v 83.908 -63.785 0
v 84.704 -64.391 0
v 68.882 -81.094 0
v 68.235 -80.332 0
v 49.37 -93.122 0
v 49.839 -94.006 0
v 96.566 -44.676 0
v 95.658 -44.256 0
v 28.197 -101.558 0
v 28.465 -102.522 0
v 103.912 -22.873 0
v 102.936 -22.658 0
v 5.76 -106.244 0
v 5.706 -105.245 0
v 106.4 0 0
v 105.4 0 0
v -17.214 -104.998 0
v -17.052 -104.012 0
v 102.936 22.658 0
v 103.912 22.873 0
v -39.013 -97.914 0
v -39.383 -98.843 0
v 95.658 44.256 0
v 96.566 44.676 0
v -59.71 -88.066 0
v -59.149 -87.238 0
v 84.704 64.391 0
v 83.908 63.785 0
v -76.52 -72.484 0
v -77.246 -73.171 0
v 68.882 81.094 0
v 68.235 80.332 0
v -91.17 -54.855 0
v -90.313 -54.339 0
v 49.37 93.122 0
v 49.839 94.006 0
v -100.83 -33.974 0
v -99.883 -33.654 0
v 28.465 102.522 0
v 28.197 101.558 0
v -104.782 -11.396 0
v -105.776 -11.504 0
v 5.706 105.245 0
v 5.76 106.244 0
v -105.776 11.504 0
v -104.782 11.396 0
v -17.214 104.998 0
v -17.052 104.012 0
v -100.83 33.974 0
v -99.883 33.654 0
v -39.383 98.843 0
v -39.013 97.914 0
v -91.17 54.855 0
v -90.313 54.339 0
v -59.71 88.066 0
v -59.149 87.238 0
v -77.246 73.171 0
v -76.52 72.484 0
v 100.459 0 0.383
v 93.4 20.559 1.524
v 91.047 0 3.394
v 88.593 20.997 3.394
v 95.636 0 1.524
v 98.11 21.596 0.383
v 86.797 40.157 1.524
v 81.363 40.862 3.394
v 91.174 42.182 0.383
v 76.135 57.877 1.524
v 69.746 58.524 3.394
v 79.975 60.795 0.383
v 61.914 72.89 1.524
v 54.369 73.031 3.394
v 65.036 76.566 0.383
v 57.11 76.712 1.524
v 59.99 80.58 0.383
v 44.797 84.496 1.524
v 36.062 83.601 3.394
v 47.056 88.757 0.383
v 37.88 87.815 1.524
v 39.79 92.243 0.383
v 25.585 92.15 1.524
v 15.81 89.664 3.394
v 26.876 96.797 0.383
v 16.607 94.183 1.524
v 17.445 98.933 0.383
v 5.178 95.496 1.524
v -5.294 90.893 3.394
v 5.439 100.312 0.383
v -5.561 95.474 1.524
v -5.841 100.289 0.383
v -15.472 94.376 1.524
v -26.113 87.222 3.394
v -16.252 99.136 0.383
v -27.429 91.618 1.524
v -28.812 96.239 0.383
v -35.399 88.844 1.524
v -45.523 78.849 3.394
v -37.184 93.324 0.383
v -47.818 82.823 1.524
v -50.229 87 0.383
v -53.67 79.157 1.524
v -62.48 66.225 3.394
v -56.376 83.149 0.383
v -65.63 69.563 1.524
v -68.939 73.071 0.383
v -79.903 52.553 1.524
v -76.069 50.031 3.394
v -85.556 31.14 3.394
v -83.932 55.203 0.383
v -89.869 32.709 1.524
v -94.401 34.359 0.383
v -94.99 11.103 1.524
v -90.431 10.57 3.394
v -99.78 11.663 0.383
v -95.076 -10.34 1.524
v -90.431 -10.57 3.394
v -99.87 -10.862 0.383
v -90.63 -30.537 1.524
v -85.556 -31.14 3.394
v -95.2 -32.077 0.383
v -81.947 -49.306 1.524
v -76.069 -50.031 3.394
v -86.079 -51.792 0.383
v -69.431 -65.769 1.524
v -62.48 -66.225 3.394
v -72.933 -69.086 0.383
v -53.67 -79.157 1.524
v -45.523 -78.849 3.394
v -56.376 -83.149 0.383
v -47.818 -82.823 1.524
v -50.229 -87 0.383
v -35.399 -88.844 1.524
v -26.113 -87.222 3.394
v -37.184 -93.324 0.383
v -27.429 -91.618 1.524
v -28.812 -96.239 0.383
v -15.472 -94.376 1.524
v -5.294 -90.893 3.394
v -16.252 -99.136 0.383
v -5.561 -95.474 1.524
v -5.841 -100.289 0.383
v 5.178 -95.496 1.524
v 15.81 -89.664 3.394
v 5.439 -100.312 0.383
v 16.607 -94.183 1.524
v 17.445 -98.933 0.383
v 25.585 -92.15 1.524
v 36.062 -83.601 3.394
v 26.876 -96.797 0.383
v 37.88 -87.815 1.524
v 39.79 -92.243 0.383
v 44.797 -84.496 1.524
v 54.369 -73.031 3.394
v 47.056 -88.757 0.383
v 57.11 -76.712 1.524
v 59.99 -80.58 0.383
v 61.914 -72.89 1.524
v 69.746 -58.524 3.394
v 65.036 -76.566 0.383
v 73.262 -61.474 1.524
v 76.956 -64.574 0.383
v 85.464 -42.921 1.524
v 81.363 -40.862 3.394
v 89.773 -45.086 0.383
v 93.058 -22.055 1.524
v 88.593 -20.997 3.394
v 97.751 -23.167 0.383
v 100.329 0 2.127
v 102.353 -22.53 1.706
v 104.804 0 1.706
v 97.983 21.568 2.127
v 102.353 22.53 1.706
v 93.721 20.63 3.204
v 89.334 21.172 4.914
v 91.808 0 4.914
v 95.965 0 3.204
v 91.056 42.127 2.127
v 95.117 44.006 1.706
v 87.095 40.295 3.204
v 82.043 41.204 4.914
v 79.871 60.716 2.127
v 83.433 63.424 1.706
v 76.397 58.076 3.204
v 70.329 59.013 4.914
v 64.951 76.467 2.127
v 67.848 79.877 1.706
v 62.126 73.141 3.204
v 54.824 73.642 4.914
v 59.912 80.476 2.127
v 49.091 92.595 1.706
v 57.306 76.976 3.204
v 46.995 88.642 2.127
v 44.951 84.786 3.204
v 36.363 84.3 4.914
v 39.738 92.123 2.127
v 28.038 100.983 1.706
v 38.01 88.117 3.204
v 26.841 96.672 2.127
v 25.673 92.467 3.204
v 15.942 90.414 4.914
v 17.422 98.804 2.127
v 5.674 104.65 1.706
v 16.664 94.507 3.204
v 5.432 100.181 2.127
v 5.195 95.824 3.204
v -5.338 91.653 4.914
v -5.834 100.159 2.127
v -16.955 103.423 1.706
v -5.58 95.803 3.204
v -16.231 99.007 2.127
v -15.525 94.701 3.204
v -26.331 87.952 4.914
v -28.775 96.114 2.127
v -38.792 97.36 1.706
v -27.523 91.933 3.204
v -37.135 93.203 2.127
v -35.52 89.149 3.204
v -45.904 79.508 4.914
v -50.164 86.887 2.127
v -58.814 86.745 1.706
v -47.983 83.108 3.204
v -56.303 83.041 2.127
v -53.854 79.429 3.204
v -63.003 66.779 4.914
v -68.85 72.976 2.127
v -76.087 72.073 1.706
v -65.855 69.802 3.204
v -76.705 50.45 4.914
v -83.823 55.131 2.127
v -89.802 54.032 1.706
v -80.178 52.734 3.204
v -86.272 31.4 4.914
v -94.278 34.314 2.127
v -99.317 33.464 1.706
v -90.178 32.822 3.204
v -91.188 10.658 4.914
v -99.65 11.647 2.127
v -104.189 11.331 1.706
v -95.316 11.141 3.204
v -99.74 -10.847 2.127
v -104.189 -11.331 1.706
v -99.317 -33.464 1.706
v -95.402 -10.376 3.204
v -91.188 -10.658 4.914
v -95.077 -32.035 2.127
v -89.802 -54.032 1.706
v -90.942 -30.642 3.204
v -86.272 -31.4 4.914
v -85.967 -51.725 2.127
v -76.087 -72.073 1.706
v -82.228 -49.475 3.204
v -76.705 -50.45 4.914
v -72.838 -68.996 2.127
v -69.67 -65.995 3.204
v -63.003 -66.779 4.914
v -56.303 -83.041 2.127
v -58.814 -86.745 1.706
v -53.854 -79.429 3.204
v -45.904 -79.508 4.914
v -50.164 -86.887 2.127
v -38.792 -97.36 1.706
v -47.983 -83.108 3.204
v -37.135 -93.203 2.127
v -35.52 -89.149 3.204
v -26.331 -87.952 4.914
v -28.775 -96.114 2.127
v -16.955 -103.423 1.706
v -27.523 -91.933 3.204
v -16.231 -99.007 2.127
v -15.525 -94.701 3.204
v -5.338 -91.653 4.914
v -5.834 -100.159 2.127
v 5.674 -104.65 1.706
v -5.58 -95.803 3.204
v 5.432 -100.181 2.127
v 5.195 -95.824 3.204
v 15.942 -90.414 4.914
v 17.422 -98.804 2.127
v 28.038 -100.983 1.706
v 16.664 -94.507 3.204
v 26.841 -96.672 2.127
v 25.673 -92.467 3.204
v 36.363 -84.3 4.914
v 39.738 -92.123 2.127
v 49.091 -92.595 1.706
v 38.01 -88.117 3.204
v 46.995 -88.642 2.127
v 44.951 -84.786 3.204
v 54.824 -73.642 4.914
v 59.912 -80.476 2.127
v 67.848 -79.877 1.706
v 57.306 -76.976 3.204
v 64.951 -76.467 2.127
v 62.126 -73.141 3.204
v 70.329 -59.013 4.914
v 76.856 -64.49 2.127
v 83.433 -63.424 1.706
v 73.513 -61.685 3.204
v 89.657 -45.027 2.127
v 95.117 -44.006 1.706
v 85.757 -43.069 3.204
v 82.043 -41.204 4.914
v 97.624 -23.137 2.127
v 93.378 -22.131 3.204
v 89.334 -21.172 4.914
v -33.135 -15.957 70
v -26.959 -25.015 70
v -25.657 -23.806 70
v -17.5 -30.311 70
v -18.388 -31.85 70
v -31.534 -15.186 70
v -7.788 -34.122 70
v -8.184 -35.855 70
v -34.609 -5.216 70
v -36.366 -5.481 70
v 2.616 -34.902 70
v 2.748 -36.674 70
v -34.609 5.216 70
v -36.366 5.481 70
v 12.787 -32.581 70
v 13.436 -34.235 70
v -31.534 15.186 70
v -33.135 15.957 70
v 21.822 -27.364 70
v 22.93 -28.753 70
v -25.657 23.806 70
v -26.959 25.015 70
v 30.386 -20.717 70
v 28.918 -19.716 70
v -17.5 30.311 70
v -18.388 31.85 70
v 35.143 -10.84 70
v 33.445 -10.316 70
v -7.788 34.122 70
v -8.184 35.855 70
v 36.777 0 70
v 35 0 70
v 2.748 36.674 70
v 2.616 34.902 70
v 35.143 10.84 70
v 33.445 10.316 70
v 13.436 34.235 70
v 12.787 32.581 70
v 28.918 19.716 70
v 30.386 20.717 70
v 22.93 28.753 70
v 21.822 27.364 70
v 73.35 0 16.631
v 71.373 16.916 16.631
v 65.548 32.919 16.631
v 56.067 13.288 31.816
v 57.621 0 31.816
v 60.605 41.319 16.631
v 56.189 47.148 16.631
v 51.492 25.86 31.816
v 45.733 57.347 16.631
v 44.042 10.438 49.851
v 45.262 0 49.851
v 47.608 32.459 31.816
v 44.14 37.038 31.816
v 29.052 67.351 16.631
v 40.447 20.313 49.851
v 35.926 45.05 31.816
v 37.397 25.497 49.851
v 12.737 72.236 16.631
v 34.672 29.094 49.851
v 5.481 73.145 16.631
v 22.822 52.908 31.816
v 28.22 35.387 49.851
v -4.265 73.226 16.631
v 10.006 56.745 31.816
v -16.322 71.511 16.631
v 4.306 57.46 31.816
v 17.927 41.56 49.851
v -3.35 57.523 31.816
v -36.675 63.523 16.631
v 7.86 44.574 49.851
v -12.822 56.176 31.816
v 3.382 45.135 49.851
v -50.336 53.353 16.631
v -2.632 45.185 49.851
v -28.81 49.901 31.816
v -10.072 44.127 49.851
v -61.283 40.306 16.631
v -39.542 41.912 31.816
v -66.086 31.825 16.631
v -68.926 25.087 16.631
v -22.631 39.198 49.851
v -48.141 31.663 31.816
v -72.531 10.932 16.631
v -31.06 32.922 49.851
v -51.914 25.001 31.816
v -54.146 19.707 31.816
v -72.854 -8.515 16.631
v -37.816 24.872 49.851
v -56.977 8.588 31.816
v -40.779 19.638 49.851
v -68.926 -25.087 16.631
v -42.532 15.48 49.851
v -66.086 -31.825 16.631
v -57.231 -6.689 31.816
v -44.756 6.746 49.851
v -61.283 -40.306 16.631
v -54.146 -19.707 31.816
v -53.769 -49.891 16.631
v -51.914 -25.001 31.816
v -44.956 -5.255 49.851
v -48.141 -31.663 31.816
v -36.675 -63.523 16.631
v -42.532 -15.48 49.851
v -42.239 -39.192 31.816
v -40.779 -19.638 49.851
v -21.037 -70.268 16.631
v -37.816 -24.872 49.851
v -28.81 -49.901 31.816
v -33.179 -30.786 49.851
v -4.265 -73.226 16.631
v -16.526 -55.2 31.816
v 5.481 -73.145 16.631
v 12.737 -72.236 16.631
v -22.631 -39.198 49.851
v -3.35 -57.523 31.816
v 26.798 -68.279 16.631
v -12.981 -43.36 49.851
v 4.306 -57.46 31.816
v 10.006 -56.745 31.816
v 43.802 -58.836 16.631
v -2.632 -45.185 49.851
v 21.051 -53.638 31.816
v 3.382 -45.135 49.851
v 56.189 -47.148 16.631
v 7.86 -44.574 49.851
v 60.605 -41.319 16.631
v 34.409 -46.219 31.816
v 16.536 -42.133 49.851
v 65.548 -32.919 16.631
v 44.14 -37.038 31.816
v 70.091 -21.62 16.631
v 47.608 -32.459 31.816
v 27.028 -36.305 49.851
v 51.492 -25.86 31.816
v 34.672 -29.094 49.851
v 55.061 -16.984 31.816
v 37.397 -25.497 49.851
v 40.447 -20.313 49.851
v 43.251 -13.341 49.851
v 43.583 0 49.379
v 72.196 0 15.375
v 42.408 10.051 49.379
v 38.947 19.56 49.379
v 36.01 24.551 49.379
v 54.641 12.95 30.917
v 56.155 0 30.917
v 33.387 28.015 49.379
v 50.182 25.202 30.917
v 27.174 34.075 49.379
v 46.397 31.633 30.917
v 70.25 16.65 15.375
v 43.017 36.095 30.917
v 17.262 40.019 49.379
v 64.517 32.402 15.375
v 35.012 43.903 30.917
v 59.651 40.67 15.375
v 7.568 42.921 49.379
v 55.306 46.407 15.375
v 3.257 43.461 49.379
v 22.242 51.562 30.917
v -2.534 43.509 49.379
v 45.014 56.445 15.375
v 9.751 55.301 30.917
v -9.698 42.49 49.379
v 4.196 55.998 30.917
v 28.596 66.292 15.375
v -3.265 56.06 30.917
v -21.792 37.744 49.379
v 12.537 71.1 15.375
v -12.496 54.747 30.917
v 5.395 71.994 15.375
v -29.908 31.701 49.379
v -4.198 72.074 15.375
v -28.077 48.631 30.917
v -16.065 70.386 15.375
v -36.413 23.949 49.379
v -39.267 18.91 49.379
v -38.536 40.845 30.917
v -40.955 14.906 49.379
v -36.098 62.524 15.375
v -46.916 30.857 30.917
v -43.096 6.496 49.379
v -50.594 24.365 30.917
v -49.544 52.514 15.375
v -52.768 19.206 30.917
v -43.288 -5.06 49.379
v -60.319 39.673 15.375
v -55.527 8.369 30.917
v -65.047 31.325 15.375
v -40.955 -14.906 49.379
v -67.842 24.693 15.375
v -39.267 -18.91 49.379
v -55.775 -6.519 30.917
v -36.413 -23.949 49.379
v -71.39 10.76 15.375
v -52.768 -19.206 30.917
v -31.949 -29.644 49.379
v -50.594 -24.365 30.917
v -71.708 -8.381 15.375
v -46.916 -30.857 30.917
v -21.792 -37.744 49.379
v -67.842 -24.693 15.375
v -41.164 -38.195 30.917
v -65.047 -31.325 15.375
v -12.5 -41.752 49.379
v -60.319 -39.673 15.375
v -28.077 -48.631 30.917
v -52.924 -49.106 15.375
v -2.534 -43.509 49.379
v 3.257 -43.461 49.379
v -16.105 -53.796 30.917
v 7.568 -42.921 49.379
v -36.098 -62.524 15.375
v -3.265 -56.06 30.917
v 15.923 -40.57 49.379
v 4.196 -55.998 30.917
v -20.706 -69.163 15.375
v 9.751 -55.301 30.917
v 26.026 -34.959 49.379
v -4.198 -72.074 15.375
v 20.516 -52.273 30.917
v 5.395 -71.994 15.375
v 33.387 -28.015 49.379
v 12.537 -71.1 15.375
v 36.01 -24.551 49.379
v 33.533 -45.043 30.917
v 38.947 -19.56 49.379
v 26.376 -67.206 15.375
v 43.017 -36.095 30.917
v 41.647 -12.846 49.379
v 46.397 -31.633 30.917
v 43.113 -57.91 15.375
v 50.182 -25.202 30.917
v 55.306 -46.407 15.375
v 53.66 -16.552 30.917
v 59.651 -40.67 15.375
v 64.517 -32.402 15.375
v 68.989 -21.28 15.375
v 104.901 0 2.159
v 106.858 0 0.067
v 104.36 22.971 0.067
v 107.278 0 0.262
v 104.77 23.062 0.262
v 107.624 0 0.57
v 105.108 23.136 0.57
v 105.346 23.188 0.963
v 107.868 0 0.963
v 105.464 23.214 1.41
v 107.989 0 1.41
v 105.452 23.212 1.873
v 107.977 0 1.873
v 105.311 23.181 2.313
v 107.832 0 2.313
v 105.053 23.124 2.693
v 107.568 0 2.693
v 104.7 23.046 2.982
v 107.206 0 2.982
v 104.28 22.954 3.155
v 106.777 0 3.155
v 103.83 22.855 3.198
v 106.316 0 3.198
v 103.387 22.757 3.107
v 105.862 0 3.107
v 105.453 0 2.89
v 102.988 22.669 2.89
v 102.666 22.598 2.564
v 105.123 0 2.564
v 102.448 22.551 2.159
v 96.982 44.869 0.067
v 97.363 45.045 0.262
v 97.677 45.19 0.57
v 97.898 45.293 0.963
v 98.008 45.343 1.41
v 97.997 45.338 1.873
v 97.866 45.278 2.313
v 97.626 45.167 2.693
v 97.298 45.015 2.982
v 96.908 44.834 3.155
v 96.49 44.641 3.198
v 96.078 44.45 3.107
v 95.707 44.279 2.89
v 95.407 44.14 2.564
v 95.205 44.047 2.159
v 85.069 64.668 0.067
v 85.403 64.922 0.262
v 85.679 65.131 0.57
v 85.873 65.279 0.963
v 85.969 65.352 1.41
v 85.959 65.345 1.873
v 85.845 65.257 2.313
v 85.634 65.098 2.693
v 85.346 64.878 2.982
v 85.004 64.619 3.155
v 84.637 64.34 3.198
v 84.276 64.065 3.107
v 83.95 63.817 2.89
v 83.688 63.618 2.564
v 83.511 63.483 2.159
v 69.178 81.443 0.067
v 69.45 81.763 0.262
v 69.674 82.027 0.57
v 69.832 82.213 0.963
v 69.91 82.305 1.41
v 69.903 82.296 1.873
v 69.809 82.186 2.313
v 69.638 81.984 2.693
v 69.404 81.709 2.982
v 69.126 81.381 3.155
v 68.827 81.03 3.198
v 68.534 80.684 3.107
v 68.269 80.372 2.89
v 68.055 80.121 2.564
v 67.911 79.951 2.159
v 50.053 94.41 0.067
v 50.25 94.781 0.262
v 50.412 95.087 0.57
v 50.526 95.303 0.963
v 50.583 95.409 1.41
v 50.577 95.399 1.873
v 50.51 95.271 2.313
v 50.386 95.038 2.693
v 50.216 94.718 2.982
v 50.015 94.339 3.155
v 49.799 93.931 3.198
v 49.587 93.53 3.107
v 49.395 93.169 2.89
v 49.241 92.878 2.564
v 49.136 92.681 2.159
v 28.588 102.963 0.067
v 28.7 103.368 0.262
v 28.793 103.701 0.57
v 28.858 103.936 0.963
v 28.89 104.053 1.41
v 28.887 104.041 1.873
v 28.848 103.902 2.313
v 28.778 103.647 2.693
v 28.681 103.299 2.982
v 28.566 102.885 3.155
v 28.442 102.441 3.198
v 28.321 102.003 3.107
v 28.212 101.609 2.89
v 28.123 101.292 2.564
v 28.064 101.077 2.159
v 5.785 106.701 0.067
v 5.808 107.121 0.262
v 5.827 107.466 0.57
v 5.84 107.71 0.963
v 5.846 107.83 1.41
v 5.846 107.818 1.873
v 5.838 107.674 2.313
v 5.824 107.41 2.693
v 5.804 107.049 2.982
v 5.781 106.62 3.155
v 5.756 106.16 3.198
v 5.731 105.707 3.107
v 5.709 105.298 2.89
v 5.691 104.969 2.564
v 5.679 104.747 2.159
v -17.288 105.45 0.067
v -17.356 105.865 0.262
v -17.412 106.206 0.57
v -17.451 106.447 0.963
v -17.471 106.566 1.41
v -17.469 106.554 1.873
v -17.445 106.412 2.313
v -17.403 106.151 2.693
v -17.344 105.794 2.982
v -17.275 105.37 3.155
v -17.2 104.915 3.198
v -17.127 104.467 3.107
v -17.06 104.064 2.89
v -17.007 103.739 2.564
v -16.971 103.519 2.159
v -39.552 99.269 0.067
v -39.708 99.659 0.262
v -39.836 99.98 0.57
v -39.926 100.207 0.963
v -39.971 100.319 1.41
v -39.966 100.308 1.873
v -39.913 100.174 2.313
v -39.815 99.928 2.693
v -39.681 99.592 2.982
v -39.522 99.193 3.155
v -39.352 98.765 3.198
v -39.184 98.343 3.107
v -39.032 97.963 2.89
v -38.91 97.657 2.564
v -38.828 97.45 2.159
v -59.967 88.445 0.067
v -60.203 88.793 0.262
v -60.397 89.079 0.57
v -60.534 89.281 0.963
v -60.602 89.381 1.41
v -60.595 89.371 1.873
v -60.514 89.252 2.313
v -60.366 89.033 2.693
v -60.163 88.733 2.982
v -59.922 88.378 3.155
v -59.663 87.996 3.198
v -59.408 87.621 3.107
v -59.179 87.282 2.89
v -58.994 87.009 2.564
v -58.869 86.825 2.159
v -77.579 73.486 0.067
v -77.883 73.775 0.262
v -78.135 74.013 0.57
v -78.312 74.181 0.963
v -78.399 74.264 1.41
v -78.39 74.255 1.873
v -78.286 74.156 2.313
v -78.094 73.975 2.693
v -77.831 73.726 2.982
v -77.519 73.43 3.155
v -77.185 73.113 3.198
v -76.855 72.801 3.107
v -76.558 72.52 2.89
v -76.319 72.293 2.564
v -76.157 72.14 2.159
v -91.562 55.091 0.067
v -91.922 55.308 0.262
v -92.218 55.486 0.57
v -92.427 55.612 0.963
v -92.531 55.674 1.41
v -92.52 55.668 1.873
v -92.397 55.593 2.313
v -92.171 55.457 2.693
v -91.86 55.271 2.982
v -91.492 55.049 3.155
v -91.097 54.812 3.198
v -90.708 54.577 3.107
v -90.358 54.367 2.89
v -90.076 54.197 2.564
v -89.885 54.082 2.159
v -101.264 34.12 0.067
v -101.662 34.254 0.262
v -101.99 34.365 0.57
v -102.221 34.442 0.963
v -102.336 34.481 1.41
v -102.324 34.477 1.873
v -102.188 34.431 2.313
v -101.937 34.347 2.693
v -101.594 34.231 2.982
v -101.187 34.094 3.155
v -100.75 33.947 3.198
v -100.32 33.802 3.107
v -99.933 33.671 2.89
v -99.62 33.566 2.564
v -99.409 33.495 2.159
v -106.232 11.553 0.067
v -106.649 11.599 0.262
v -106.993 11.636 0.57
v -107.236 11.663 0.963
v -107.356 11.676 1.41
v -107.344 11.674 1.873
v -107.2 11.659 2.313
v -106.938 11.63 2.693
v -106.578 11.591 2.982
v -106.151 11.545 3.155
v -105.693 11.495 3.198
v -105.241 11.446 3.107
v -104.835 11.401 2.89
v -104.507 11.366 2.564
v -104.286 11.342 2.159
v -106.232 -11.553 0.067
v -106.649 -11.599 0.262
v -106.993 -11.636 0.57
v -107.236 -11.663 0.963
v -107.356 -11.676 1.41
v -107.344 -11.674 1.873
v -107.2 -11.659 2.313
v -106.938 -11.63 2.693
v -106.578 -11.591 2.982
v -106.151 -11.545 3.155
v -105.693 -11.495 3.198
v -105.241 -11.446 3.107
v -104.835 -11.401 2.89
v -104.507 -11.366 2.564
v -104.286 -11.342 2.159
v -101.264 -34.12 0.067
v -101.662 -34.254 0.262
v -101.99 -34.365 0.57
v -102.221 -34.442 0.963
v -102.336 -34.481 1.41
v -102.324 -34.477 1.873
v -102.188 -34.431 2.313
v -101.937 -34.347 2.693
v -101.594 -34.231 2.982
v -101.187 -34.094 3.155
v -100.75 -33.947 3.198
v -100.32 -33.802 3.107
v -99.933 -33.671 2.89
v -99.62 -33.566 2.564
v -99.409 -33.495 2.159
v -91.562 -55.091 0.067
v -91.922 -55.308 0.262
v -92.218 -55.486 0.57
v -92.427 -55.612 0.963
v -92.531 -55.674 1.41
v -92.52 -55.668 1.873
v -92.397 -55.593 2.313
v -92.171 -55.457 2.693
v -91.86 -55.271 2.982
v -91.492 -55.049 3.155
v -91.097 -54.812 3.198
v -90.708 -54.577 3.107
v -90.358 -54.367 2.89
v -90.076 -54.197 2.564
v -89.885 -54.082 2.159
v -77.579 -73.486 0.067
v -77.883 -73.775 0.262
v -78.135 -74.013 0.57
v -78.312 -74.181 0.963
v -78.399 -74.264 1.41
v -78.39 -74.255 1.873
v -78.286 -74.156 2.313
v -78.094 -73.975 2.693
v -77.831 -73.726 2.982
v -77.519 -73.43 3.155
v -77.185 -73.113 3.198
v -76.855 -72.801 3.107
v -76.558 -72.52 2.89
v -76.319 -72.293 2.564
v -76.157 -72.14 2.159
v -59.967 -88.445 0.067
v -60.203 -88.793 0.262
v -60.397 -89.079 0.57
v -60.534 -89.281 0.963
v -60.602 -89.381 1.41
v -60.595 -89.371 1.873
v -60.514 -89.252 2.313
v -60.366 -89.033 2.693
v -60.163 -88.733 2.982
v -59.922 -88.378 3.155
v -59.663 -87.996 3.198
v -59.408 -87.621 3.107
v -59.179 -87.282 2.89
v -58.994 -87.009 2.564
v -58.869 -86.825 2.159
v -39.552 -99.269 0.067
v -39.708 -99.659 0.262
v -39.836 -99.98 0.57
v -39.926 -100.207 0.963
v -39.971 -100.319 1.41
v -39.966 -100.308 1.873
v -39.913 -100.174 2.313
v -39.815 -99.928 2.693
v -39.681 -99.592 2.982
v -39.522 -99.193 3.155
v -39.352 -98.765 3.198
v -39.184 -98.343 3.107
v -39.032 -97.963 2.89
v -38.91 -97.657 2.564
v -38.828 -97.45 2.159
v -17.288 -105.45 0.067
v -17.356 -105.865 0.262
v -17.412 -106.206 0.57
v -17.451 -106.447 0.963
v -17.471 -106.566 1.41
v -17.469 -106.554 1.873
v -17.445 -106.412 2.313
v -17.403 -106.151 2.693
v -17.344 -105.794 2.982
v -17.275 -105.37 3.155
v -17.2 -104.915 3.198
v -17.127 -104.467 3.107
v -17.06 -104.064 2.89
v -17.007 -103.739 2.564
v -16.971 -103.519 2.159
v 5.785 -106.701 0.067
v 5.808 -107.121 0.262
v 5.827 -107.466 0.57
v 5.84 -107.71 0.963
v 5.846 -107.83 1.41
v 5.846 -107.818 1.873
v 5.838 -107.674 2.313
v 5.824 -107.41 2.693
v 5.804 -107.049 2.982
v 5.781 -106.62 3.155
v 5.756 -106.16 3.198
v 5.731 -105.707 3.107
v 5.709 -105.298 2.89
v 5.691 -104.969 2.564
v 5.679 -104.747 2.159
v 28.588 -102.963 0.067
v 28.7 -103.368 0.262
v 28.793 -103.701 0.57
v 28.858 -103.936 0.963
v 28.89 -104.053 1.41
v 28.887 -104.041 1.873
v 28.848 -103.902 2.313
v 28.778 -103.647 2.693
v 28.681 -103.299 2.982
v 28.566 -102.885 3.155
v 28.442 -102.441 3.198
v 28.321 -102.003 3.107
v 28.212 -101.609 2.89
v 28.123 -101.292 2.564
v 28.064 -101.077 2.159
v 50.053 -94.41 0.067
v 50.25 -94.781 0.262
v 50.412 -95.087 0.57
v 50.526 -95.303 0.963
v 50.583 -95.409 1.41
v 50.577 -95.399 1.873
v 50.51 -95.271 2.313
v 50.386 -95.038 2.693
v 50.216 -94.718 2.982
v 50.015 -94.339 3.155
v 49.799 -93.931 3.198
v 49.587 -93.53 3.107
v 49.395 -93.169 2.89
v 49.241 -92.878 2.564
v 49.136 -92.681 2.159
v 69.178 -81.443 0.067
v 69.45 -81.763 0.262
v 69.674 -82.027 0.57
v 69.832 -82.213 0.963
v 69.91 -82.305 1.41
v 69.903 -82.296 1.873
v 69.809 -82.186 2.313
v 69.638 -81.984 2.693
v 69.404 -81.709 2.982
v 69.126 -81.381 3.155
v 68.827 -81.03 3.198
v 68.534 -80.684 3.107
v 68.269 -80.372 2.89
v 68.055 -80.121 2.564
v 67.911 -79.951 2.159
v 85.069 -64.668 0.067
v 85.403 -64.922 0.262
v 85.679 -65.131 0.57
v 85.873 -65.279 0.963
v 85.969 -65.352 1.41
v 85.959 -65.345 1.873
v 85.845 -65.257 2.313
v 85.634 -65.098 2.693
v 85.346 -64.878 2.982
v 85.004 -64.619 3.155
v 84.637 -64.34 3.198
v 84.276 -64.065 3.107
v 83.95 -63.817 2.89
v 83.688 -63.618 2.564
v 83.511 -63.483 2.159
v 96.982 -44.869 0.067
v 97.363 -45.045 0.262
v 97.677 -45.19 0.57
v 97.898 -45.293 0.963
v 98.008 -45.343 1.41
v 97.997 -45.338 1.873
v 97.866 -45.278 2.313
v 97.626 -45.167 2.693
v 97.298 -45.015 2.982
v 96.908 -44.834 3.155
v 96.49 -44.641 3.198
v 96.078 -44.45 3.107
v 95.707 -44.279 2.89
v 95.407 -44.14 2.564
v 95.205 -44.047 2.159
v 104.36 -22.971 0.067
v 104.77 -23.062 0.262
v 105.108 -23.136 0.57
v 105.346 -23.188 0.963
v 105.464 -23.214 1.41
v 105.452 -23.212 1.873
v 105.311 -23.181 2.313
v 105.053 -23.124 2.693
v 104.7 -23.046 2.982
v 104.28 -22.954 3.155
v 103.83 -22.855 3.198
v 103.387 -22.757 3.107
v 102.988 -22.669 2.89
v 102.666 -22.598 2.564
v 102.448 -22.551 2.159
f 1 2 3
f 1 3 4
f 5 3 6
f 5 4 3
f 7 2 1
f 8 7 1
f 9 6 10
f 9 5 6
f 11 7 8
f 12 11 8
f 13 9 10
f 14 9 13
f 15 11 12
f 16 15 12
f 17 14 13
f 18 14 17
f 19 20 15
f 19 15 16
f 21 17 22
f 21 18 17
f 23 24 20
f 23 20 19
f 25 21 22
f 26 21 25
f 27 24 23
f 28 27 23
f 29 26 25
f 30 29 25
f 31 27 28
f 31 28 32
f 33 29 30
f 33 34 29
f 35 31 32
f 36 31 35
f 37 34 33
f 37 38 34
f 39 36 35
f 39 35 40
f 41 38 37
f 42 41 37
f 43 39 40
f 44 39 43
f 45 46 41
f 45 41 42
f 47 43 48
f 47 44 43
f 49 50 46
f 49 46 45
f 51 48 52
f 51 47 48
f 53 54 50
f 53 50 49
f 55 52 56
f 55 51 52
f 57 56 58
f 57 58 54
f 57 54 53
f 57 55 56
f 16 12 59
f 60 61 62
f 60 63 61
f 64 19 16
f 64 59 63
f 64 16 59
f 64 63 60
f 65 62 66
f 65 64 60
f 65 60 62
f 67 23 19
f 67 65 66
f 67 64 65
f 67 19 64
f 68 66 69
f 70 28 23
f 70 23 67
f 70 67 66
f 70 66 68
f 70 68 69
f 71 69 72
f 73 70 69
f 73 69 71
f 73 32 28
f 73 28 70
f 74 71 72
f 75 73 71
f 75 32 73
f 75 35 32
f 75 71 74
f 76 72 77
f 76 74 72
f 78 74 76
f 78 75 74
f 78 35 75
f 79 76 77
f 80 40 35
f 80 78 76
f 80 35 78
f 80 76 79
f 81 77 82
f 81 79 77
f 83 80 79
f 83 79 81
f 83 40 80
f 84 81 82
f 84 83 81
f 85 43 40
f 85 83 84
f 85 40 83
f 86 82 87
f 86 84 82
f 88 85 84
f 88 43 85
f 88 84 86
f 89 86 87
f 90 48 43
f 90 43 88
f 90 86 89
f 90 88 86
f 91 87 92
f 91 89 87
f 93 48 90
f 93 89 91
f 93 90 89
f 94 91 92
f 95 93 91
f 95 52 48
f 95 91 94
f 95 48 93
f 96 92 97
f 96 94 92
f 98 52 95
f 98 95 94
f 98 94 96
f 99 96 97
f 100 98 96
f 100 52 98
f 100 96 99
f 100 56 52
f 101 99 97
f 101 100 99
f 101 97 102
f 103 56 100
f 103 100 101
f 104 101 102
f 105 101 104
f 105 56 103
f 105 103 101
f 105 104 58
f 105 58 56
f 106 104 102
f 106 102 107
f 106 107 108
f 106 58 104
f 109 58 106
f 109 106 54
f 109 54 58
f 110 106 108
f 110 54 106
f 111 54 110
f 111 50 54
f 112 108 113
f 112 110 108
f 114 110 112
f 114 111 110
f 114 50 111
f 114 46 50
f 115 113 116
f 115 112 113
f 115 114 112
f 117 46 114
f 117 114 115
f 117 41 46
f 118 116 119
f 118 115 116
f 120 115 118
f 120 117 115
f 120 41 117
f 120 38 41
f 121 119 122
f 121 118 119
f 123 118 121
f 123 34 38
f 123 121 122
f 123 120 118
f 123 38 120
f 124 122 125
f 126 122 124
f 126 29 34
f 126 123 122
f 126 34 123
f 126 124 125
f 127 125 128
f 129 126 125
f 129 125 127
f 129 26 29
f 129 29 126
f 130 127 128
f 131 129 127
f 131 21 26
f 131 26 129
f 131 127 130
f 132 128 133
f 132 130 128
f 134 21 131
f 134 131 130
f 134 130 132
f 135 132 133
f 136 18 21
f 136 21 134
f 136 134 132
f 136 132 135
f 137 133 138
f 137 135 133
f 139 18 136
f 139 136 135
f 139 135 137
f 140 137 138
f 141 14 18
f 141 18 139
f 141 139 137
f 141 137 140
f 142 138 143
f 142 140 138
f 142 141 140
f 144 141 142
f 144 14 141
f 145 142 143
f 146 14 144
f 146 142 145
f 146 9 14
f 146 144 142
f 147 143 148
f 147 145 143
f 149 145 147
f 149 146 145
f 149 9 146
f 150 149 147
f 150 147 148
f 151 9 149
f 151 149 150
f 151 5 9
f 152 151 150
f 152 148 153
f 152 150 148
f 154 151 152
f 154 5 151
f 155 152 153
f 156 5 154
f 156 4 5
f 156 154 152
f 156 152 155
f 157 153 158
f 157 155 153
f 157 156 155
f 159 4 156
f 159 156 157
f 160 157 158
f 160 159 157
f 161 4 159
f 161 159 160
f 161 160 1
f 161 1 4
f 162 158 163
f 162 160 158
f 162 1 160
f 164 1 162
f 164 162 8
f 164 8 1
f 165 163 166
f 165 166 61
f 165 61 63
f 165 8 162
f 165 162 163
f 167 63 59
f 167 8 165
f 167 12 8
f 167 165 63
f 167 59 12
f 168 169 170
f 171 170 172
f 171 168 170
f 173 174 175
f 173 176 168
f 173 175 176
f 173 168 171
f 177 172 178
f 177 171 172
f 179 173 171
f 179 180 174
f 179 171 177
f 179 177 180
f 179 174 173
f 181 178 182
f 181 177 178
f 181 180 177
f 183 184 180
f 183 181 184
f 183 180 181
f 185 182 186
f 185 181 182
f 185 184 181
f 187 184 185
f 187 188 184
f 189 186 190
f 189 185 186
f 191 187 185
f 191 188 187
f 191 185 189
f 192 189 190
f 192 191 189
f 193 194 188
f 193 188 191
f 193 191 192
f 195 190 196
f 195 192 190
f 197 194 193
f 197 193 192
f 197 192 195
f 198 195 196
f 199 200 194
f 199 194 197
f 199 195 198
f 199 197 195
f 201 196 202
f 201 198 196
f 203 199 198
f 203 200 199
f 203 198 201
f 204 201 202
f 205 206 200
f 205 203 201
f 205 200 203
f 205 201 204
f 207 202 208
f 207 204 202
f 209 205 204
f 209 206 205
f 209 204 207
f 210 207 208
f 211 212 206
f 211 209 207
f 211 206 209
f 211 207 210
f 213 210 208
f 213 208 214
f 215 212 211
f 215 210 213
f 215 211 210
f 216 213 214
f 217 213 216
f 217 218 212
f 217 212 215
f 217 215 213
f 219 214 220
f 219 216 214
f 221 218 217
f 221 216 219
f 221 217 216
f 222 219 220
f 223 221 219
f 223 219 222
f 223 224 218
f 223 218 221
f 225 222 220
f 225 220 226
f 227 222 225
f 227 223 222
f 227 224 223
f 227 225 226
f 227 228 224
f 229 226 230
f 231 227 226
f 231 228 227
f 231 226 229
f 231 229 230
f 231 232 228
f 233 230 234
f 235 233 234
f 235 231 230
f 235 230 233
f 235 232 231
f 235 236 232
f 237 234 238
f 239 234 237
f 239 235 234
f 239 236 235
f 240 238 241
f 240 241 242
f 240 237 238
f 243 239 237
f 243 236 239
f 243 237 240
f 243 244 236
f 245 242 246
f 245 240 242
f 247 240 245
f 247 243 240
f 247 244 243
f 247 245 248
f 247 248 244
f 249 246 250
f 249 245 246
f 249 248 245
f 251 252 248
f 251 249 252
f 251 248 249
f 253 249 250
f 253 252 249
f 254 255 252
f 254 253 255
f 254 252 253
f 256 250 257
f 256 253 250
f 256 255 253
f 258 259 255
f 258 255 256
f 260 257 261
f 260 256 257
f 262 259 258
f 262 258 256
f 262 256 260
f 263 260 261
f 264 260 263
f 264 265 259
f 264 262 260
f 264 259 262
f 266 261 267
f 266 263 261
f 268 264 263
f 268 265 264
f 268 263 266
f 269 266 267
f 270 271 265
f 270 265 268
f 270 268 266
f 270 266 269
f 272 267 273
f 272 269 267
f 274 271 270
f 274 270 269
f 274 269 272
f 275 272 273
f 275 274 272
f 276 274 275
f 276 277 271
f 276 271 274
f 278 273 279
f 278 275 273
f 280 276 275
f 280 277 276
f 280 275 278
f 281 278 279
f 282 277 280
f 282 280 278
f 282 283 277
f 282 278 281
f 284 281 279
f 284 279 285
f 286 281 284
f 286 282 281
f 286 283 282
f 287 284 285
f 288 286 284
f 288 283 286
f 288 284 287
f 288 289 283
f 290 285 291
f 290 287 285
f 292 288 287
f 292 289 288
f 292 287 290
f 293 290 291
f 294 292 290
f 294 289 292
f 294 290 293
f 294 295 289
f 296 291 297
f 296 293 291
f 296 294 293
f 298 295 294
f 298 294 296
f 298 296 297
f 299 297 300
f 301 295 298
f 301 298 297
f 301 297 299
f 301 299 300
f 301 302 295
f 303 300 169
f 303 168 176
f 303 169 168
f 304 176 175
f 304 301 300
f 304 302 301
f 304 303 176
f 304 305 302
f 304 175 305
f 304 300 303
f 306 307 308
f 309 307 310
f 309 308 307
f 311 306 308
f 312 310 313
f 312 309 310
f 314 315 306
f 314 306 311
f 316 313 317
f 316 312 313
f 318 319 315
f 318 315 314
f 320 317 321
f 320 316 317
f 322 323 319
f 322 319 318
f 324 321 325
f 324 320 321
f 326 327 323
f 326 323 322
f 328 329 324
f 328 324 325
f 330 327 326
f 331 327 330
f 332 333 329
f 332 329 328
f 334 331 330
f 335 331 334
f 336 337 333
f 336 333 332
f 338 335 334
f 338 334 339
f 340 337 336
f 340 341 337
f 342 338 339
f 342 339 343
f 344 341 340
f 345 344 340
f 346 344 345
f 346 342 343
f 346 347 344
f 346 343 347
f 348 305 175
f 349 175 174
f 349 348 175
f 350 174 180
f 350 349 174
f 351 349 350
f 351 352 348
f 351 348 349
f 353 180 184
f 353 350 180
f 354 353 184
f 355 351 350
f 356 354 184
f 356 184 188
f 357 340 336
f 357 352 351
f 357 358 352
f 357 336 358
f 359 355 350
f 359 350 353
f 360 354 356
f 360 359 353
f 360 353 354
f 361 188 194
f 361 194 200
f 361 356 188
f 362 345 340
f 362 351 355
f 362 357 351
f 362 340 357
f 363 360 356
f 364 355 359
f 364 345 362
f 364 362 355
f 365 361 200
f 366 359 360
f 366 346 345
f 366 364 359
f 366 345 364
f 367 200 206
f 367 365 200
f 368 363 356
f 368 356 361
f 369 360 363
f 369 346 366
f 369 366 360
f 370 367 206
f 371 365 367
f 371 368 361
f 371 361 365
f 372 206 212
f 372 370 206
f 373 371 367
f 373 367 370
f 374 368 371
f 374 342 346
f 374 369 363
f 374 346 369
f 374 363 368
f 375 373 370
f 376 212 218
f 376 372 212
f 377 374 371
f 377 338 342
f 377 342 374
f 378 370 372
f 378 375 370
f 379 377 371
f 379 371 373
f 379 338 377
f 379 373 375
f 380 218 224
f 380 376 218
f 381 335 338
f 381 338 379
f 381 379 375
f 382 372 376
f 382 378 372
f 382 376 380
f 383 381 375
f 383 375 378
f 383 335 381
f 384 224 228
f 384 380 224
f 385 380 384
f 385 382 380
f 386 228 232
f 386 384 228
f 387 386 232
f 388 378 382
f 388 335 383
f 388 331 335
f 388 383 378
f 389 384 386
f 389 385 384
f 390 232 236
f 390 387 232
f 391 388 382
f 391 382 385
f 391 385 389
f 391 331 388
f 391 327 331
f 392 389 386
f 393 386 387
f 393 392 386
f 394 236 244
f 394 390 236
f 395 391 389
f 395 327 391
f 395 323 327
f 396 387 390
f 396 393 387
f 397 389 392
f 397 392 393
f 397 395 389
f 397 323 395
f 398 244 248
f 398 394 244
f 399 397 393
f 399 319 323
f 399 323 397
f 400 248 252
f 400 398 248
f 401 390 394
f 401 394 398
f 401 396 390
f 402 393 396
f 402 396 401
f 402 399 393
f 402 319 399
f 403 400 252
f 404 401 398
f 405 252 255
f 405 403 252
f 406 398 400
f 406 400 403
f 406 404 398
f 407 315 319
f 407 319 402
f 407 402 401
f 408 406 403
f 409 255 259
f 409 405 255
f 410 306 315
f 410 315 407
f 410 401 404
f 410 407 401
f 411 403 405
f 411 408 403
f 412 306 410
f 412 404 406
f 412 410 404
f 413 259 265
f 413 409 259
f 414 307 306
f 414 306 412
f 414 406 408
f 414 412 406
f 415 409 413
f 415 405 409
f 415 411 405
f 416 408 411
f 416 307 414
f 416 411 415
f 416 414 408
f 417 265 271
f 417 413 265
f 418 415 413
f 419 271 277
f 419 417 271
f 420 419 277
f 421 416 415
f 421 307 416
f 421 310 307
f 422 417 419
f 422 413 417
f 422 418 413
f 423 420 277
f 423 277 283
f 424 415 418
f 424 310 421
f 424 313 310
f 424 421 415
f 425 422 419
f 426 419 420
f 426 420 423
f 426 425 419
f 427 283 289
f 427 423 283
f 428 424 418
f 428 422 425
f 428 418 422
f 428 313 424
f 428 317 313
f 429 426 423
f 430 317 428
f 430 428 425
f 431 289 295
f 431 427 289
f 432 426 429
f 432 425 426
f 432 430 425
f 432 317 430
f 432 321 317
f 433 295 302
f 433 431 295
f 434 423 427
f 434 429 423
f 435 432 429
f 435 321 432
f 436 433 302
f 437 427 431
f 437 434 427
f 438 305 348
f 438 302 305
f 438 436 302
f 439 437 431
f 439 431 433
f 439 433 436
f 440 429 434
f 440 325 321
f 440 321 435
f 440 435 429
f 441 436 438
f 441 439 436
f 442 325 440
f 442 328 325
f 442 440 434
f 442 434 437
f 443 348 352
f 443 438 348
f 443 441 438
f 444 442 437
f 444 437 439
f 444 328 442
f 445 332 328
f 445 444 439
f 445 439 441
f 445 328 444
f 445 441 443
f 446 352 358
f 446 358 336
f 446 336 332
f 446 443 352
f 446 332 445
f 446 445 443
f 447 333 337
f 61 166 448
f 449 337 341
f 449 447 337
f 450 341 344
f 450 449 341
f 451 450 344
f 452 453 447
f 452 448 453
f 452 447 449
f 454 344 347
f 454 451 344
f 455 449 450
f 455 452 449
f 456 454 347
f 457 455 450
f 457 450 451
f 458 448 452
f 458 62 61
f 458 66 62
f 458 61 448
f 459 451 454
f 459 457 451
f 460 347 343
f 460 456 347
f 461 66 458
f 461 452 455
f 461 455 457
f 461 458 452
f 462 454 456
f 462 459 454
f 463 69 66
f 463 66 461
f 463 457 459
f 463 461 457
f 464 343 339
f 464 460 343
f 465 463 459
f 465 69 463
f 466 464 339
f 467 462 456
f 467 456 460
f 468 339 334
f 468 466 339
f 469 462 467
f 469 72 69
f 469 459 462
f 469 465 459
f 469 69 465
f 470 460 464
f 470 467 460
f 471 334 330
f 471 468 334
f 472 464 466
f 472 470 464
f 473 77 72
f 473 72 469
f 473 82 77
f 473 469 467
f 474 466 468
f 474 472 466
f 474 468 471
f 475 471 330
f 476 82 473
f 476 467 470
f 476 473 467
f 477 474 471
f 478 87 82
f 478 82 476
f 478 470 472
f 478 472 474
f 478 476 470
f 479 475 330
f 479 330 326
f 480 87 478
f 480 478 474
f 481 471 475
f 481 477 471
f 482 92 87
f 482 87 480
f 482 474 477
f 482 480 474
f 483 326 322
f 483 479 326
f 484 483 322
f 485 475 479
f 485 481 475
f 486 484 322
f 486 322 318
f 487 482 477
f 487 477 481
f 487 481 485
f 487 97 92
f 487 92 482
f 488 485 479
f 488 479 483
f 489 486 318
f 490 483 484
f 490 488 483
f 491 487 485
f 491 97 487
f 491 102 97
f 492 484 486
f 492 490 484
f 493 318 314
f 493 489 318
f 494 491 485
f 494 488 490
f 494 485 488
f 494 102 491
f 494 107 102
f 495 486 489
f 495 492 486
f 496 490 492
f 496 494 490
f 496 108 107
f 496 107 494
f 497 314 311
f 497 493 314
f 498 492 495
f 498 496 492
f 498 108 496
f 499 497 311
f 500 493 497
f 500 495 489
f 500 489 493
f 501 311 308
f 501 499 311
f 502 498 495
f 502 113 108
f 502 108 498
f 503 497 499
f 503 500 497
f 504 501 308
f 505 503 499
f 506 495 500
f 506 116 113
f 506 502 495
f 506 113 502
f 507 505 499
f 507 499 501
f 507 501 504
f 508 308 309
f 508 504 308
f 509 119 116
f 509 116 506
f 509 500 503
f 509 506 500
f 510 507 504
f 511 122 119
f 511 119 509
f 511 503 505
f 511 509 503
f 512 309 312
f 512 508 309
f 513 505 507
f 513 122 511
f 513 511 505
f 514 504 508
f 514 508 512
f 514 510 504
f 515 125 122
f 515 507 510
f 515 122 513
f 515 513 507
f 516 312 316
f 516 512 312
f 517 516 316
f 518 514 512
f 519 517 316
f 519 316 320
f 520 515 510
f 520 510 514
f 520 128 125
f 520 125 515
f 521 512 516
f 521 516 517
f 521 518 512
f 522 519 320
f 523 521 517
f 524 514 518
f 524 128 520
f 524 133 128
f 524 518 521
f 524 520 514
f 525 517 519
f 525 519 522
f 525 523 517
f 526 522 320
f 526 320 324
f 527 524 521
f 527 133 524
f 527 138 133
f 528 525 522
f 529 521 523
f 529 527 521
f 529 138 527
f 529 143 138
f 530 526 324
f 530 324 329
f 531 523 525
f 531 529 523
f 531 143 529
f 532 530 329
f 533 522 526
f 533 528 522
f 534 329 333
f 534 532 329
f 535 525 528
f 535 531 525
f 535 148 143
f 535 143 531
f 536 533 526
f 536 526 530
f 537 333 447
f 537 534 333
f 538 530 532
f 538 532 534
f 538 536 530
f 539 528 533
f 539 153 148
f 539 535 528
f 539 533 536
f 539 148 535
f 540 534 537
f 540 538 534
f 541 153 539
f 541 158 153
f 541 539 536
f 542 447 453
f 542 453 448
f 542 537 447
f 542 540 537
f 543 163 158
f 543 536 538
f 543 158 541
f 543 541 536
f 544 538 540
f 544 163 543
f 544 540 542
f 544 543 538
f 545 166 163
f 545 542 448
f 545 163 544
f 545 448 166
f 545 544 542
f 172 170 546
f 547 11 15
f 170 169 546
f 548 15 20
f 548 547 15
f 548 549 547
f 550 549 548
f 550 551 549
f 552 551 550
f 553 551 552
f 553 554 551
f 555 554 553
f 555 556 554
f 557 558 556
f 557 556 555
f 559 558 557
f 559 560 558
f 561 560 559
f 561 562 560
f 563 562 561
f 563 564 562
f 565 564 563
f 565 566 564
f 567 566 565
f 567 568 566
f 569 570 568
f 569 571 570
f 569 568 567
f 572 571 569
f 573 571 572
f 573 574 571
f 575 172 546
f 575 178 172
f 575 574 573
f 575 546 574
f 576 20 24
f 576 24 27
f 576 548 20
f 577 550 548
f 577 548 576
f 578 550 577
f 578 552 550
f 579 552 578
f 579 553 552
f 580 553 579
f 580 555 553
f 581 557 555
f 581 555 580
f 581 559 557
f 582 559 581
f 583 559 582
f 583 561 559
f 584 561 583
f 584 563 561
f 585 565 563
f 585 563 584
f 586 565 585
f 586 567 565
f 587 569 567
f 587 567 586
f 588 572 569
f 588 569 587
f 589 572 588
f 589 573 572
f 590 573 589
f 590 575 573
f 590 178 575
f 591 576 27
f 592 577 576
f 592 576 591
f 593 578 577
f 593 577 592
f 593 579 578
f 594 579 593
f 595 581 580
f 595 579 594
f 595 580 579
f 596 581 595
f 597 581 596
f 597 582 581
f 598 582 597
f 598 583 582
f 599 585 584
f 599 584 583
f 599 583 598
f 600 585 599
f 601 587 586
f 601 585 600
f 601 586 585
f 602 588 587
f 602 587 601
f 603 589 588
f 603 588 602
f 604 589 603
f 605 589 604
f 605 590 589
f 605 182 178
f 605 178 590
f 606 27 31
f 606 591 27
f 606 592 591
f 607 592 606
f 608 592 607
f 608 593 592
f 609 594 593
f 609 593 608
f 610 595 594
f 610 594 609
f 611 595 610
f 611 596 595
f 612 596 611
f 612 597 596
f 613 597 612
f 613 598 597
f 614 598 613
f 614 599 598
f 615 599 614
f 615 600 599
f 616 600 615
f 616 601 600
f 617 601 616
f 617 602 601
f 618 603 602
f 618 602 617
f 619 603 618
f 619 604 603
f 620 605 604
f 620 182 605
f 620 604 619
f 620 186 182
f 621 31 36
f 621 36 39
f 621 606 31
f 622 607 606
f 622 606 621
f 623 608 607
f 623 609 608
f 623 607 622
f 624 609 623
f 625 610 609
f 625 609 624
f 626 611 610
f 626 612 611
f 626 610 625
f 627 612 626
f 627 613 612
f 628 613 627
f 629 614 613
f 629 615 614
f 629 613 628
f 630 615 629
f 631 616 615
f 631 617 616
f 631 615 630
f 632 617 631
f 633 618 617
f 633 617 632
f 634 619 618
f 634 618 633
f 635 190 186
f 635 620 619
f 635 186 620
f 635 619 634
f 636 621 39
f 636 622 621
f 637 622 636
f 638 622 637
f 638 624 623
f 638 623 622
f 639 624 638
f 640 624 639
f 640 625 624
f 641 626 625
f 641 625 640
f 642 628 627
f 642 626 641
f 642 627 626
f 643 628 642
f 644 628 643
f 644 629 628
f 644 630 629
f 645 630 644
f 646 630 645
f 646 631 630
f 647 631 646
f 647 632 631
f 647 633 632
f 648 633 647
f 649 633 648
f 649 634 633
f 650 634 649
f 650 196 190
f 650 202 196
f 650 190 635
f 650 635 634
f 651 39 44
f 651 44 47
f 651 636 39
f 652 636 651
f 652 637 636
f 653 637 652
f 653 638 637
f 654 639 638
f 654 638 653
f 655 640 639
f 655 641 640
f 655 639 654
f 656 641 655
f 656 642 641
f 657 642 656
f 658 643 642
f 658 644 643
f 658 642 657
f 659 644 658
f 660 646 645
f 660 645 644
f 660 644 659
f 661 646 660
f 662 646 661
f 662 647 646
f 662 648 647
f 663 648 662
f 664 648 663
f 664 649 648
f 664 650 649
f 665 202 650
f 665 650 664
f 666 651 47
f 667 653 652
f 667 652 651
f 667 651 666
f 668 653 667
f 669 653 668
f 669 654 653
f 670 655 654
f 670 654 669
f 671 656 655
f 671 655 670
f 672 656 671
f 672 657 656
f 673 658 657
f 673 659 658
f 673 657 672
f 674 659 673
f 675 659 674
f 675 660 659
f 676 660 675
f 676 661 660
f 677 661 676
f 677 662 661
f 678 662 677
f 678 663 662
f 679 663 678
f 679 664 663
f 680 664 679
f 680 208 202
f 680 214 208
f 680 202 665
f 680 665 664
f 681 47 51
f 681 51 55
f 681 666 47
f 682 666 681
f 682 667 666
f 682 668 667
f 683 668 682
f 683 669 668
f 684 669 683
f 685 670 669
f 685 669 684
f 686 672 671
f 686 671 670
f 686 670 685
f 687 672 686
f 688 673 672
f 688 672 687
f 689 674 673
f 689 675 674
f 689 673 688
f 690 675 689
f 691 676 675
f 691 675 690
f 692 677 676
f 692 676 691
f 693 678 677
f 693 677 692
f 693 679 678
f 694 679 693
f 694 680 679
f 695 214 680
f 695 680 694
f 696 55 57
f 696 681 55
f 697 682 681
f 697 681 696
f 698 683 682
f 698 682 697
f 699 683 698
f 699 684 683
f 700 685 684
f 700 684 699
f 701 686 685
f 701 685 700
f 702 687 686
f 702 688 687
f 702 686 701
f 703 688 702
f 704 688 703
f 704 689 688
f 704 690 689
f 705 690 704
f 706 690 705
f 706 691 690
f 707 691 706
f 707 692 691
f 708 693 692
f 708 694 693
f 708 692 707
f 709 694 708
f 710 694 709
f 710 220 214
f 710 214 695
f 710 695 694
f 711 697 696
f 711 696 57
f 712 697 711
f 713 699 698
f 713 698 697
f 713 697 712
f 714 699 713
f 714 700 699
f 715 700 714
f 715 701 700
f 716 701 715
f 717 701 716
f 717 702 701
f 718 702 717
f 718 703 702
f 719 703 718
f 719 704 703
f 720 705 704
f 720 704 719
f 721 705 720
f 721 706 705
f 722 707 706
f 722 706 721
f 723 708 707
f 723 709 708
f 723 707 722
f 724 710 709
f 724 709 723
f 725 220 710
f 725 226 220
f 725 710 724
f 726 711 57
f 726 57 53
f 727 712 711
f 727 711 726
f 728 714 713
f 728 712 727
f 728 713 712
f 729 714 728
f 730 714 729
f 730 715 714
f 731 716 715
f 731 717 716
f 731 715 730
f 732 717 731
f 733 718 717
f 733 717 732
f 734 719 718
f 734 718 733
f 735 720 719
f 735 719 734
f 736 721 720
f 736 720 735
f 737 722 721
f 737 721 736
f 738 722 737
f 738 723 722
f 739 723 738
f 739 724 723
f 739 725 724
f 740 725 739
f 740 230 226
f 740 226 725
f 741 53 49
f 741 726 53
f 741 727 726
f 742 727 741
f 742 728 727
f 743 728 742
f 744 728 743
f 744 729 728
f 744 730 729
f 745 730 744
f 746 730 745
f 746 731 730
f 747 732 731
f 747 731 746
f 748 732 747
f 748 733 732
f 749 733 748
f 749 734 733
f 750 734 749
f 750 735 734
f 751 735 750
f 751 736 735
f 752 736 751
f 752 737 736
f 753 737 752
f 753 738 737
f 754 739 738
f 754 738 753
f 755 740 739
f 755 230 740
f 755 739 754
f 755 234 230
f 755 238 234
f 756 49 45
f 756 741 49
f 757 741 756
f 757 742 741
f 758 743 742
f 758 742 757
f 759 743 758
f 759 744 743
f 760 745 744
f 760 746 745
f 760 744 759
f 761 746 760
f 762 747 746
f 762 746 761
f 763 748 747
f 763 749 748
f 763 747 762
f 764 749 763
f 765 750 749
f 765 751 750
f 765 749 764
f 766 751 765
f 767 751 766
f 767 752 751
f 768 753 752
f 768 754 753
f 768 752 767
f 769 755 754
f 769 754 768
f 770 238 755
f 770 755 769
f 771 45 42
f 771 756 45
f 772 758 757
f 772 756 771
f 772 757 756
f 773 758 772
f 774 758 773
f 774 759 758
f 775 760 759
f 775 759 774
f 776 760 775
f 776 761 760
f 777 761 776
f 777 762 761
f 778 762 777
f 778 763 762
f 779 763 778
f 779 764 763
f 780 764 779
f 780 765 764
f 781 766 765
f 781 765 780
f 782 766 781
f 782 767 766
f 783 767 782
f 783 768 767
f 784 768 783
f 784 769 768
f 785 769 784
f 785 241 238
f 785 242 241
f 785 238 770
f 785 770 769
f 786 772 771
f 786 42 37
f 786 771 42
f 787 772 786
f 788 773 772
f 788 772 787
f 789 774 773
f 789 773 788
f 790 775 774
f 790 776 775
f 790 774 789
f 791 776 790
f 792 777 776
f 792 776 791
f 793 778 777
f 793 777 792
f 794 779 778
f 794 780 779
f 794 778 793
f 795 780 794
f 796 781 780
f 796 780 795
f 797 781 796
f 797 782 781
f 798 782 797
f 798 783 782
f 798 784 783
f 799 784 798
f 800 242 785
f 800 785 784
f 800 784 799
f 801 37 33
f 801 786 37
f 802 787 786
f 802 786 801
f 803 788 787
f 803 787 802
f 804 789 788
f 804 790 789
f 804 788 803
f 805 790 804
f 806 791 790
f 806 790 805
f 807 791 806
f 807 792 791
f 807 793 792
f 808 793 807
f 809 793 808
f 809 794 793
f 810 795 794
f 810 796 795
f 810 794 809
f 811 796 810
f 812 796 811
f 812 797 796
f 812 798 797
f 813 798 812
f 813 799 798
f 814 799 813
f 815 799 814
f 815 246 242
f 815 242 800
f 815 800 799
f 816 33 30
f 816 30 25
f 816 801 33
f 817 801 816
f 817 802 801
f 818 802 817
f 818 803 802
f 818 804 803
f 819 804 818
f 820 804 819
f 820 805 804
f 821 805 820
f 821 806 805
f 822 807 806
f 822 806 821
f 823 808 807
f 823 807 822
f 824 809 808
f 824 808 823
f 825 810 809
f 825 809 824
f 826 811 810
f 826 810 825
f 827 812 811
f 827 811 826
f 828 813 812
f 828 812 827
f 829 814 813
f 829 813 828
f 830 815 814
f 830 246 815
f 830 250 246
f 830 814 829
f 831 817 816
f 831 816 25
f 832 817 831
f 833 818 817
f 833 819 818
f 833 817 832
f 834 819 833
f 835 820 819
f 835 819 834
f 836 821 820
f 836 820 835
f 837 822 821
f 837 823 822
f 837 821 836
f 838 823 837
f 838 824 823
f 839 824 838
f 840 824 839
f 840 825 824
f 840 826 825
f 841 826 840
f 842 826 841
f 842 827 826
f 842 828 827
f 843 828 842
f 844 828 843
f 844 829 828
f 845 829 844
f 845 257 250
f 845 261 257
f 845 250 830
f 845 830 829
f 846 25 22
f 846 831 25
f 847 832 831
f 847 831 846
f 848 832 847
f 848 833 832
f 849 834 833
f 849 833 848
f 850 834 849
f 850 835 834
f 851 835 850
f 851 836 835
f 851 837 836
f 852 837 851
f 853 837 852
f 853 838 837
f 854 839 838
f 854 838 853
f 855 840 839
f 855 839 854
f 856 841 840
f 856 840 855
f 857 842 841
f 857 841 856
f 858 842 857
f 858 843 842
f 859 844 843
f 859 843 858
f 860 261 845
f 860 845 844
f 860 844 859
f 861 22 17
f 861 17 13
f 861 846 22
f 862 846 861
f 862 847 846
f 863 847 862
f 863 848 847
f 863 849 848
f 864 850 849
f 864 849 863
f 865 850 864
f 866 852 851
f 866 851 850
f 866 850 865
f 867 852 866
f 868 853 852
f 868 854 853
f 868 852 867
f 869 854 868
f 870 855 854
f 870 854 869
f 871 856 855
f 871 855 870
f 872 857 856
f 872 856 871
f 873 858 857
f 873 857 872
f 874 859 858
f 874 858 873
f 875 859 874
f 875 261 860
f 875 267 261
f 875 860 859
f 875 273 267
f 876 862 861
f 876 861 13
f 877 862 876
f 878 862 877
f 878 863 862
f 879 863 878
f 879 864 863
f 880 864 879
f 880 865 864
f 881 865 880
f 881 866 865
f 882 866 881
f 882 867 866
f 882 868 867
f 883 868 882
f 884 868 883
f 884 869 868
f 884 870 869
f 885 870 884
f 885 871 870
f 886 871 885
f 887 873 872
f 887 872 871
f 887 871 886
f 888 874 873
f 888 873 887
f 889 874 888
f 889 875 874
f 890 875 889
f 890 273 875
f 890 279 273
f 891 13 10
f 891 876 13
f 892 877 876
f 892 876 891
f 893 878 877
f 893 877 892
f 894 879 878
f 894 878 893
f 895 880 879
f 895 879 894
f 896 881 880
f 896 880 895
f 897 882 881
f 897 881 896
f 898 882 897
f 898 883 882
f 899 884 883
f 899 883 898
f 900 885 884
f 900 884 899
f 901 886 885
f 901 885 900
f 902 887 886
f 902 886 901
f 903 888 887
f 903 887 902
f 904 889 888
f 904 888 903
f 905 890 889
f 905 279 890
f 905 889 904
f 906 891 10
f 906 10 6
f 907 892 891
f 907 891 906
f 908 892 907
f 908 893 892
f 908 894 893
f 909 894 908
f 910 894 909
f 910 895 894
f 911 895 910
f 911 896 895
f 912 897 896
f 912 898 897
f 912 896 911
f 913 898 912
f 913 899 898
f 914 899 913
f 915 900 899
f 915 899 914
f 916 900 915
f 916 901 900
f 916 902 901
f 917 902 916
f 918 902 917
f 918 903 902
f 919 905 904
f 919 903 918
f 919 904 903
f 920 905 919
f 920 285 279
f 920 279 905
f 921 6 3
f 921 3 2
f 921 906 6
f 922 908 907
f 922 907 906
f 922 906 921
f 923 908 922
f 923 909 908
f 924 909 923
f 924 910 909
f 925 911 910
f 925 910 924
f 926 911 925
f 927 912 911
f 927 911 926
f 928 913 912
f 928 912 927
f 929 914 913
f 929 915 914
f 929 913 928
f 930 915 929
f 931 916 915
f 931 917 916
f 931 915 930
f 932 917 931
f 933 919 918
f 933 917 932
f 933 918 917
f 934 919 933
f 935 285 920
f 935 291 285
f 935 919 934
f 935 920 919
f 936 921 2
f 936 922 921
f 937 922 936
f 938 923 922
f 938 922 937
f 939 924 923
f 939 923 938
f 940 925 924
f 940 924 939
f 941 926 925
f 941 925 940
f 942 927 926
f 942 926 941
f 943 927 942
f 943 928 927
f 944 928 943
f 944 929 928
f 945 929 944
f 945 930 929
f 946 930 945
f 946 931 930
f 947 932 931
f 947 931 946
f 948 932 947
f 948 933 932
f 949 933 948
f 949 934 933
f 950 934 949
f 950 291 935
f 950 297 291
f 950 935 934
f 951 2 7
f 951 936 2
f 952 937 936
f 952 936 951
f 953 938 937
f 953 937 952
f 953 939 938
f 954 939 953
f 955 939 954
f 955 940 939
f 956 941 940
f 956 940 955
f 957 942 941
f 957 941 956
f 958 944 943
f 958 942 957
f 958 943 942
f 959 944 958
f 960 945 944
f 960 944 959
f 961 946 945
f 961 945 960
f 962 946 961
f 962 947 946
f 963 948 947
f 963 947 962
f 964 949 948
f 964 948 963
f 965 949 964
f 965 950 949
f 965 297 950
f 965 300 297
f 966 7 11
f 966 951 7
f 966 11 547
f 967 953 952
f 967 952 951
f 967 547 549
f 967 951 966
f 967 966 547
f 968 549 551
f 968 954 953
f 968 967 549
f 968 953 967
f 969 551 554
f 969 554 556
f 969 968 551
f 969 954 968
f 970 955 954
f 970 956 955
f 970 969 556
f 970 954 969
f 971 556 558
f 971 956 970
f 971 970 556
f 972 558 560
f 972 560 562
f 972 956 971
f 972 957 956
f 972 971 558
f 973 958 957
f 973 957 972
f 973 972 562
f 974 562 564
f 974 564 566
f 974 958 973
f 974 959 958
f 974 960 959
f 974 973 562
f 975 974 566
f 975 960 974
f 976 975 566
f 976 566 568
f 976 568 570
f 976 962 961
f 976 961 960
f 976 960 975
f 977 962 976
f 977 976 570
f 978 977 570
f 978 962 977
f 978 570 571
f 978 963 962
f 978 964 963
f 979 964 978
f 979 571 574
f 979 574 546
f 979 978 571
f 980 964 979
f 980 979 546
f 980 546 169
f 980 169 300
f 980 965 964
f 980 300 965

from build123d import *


with BuildPart() as f1:
    # F0 (on Front) → F1 (revolve)
    with BuildSketch(Plane.XZ):
        with BuildLine():
            Line((105.4, 0), (106.4, 0))
            ThreePointArc((106.4, 0), (107.5682, 2.693302), (104.803506, 1.705864))
            ThreePointArc((104.803506, 1.705864), (98.126839, 2.584605), (91.808444, 4.914402))
            ThreePointArc((91.808444, 4.914402), (57.62064, 31.81586), (36.776793, 70))
            Line((36.776793, 70), (35, 70))
            ThreePointArc((35, 70), (56.154601, 30.917261), (91.046937, 3.394498))
            ThreePointArc((91.046937, 3.394498), (98.025499, 0.86017), (105.4, 0))
        make_face()
    revolve(axis=Axis((0, 0, 35), (0, 0, 1)))


solid = f1.part
